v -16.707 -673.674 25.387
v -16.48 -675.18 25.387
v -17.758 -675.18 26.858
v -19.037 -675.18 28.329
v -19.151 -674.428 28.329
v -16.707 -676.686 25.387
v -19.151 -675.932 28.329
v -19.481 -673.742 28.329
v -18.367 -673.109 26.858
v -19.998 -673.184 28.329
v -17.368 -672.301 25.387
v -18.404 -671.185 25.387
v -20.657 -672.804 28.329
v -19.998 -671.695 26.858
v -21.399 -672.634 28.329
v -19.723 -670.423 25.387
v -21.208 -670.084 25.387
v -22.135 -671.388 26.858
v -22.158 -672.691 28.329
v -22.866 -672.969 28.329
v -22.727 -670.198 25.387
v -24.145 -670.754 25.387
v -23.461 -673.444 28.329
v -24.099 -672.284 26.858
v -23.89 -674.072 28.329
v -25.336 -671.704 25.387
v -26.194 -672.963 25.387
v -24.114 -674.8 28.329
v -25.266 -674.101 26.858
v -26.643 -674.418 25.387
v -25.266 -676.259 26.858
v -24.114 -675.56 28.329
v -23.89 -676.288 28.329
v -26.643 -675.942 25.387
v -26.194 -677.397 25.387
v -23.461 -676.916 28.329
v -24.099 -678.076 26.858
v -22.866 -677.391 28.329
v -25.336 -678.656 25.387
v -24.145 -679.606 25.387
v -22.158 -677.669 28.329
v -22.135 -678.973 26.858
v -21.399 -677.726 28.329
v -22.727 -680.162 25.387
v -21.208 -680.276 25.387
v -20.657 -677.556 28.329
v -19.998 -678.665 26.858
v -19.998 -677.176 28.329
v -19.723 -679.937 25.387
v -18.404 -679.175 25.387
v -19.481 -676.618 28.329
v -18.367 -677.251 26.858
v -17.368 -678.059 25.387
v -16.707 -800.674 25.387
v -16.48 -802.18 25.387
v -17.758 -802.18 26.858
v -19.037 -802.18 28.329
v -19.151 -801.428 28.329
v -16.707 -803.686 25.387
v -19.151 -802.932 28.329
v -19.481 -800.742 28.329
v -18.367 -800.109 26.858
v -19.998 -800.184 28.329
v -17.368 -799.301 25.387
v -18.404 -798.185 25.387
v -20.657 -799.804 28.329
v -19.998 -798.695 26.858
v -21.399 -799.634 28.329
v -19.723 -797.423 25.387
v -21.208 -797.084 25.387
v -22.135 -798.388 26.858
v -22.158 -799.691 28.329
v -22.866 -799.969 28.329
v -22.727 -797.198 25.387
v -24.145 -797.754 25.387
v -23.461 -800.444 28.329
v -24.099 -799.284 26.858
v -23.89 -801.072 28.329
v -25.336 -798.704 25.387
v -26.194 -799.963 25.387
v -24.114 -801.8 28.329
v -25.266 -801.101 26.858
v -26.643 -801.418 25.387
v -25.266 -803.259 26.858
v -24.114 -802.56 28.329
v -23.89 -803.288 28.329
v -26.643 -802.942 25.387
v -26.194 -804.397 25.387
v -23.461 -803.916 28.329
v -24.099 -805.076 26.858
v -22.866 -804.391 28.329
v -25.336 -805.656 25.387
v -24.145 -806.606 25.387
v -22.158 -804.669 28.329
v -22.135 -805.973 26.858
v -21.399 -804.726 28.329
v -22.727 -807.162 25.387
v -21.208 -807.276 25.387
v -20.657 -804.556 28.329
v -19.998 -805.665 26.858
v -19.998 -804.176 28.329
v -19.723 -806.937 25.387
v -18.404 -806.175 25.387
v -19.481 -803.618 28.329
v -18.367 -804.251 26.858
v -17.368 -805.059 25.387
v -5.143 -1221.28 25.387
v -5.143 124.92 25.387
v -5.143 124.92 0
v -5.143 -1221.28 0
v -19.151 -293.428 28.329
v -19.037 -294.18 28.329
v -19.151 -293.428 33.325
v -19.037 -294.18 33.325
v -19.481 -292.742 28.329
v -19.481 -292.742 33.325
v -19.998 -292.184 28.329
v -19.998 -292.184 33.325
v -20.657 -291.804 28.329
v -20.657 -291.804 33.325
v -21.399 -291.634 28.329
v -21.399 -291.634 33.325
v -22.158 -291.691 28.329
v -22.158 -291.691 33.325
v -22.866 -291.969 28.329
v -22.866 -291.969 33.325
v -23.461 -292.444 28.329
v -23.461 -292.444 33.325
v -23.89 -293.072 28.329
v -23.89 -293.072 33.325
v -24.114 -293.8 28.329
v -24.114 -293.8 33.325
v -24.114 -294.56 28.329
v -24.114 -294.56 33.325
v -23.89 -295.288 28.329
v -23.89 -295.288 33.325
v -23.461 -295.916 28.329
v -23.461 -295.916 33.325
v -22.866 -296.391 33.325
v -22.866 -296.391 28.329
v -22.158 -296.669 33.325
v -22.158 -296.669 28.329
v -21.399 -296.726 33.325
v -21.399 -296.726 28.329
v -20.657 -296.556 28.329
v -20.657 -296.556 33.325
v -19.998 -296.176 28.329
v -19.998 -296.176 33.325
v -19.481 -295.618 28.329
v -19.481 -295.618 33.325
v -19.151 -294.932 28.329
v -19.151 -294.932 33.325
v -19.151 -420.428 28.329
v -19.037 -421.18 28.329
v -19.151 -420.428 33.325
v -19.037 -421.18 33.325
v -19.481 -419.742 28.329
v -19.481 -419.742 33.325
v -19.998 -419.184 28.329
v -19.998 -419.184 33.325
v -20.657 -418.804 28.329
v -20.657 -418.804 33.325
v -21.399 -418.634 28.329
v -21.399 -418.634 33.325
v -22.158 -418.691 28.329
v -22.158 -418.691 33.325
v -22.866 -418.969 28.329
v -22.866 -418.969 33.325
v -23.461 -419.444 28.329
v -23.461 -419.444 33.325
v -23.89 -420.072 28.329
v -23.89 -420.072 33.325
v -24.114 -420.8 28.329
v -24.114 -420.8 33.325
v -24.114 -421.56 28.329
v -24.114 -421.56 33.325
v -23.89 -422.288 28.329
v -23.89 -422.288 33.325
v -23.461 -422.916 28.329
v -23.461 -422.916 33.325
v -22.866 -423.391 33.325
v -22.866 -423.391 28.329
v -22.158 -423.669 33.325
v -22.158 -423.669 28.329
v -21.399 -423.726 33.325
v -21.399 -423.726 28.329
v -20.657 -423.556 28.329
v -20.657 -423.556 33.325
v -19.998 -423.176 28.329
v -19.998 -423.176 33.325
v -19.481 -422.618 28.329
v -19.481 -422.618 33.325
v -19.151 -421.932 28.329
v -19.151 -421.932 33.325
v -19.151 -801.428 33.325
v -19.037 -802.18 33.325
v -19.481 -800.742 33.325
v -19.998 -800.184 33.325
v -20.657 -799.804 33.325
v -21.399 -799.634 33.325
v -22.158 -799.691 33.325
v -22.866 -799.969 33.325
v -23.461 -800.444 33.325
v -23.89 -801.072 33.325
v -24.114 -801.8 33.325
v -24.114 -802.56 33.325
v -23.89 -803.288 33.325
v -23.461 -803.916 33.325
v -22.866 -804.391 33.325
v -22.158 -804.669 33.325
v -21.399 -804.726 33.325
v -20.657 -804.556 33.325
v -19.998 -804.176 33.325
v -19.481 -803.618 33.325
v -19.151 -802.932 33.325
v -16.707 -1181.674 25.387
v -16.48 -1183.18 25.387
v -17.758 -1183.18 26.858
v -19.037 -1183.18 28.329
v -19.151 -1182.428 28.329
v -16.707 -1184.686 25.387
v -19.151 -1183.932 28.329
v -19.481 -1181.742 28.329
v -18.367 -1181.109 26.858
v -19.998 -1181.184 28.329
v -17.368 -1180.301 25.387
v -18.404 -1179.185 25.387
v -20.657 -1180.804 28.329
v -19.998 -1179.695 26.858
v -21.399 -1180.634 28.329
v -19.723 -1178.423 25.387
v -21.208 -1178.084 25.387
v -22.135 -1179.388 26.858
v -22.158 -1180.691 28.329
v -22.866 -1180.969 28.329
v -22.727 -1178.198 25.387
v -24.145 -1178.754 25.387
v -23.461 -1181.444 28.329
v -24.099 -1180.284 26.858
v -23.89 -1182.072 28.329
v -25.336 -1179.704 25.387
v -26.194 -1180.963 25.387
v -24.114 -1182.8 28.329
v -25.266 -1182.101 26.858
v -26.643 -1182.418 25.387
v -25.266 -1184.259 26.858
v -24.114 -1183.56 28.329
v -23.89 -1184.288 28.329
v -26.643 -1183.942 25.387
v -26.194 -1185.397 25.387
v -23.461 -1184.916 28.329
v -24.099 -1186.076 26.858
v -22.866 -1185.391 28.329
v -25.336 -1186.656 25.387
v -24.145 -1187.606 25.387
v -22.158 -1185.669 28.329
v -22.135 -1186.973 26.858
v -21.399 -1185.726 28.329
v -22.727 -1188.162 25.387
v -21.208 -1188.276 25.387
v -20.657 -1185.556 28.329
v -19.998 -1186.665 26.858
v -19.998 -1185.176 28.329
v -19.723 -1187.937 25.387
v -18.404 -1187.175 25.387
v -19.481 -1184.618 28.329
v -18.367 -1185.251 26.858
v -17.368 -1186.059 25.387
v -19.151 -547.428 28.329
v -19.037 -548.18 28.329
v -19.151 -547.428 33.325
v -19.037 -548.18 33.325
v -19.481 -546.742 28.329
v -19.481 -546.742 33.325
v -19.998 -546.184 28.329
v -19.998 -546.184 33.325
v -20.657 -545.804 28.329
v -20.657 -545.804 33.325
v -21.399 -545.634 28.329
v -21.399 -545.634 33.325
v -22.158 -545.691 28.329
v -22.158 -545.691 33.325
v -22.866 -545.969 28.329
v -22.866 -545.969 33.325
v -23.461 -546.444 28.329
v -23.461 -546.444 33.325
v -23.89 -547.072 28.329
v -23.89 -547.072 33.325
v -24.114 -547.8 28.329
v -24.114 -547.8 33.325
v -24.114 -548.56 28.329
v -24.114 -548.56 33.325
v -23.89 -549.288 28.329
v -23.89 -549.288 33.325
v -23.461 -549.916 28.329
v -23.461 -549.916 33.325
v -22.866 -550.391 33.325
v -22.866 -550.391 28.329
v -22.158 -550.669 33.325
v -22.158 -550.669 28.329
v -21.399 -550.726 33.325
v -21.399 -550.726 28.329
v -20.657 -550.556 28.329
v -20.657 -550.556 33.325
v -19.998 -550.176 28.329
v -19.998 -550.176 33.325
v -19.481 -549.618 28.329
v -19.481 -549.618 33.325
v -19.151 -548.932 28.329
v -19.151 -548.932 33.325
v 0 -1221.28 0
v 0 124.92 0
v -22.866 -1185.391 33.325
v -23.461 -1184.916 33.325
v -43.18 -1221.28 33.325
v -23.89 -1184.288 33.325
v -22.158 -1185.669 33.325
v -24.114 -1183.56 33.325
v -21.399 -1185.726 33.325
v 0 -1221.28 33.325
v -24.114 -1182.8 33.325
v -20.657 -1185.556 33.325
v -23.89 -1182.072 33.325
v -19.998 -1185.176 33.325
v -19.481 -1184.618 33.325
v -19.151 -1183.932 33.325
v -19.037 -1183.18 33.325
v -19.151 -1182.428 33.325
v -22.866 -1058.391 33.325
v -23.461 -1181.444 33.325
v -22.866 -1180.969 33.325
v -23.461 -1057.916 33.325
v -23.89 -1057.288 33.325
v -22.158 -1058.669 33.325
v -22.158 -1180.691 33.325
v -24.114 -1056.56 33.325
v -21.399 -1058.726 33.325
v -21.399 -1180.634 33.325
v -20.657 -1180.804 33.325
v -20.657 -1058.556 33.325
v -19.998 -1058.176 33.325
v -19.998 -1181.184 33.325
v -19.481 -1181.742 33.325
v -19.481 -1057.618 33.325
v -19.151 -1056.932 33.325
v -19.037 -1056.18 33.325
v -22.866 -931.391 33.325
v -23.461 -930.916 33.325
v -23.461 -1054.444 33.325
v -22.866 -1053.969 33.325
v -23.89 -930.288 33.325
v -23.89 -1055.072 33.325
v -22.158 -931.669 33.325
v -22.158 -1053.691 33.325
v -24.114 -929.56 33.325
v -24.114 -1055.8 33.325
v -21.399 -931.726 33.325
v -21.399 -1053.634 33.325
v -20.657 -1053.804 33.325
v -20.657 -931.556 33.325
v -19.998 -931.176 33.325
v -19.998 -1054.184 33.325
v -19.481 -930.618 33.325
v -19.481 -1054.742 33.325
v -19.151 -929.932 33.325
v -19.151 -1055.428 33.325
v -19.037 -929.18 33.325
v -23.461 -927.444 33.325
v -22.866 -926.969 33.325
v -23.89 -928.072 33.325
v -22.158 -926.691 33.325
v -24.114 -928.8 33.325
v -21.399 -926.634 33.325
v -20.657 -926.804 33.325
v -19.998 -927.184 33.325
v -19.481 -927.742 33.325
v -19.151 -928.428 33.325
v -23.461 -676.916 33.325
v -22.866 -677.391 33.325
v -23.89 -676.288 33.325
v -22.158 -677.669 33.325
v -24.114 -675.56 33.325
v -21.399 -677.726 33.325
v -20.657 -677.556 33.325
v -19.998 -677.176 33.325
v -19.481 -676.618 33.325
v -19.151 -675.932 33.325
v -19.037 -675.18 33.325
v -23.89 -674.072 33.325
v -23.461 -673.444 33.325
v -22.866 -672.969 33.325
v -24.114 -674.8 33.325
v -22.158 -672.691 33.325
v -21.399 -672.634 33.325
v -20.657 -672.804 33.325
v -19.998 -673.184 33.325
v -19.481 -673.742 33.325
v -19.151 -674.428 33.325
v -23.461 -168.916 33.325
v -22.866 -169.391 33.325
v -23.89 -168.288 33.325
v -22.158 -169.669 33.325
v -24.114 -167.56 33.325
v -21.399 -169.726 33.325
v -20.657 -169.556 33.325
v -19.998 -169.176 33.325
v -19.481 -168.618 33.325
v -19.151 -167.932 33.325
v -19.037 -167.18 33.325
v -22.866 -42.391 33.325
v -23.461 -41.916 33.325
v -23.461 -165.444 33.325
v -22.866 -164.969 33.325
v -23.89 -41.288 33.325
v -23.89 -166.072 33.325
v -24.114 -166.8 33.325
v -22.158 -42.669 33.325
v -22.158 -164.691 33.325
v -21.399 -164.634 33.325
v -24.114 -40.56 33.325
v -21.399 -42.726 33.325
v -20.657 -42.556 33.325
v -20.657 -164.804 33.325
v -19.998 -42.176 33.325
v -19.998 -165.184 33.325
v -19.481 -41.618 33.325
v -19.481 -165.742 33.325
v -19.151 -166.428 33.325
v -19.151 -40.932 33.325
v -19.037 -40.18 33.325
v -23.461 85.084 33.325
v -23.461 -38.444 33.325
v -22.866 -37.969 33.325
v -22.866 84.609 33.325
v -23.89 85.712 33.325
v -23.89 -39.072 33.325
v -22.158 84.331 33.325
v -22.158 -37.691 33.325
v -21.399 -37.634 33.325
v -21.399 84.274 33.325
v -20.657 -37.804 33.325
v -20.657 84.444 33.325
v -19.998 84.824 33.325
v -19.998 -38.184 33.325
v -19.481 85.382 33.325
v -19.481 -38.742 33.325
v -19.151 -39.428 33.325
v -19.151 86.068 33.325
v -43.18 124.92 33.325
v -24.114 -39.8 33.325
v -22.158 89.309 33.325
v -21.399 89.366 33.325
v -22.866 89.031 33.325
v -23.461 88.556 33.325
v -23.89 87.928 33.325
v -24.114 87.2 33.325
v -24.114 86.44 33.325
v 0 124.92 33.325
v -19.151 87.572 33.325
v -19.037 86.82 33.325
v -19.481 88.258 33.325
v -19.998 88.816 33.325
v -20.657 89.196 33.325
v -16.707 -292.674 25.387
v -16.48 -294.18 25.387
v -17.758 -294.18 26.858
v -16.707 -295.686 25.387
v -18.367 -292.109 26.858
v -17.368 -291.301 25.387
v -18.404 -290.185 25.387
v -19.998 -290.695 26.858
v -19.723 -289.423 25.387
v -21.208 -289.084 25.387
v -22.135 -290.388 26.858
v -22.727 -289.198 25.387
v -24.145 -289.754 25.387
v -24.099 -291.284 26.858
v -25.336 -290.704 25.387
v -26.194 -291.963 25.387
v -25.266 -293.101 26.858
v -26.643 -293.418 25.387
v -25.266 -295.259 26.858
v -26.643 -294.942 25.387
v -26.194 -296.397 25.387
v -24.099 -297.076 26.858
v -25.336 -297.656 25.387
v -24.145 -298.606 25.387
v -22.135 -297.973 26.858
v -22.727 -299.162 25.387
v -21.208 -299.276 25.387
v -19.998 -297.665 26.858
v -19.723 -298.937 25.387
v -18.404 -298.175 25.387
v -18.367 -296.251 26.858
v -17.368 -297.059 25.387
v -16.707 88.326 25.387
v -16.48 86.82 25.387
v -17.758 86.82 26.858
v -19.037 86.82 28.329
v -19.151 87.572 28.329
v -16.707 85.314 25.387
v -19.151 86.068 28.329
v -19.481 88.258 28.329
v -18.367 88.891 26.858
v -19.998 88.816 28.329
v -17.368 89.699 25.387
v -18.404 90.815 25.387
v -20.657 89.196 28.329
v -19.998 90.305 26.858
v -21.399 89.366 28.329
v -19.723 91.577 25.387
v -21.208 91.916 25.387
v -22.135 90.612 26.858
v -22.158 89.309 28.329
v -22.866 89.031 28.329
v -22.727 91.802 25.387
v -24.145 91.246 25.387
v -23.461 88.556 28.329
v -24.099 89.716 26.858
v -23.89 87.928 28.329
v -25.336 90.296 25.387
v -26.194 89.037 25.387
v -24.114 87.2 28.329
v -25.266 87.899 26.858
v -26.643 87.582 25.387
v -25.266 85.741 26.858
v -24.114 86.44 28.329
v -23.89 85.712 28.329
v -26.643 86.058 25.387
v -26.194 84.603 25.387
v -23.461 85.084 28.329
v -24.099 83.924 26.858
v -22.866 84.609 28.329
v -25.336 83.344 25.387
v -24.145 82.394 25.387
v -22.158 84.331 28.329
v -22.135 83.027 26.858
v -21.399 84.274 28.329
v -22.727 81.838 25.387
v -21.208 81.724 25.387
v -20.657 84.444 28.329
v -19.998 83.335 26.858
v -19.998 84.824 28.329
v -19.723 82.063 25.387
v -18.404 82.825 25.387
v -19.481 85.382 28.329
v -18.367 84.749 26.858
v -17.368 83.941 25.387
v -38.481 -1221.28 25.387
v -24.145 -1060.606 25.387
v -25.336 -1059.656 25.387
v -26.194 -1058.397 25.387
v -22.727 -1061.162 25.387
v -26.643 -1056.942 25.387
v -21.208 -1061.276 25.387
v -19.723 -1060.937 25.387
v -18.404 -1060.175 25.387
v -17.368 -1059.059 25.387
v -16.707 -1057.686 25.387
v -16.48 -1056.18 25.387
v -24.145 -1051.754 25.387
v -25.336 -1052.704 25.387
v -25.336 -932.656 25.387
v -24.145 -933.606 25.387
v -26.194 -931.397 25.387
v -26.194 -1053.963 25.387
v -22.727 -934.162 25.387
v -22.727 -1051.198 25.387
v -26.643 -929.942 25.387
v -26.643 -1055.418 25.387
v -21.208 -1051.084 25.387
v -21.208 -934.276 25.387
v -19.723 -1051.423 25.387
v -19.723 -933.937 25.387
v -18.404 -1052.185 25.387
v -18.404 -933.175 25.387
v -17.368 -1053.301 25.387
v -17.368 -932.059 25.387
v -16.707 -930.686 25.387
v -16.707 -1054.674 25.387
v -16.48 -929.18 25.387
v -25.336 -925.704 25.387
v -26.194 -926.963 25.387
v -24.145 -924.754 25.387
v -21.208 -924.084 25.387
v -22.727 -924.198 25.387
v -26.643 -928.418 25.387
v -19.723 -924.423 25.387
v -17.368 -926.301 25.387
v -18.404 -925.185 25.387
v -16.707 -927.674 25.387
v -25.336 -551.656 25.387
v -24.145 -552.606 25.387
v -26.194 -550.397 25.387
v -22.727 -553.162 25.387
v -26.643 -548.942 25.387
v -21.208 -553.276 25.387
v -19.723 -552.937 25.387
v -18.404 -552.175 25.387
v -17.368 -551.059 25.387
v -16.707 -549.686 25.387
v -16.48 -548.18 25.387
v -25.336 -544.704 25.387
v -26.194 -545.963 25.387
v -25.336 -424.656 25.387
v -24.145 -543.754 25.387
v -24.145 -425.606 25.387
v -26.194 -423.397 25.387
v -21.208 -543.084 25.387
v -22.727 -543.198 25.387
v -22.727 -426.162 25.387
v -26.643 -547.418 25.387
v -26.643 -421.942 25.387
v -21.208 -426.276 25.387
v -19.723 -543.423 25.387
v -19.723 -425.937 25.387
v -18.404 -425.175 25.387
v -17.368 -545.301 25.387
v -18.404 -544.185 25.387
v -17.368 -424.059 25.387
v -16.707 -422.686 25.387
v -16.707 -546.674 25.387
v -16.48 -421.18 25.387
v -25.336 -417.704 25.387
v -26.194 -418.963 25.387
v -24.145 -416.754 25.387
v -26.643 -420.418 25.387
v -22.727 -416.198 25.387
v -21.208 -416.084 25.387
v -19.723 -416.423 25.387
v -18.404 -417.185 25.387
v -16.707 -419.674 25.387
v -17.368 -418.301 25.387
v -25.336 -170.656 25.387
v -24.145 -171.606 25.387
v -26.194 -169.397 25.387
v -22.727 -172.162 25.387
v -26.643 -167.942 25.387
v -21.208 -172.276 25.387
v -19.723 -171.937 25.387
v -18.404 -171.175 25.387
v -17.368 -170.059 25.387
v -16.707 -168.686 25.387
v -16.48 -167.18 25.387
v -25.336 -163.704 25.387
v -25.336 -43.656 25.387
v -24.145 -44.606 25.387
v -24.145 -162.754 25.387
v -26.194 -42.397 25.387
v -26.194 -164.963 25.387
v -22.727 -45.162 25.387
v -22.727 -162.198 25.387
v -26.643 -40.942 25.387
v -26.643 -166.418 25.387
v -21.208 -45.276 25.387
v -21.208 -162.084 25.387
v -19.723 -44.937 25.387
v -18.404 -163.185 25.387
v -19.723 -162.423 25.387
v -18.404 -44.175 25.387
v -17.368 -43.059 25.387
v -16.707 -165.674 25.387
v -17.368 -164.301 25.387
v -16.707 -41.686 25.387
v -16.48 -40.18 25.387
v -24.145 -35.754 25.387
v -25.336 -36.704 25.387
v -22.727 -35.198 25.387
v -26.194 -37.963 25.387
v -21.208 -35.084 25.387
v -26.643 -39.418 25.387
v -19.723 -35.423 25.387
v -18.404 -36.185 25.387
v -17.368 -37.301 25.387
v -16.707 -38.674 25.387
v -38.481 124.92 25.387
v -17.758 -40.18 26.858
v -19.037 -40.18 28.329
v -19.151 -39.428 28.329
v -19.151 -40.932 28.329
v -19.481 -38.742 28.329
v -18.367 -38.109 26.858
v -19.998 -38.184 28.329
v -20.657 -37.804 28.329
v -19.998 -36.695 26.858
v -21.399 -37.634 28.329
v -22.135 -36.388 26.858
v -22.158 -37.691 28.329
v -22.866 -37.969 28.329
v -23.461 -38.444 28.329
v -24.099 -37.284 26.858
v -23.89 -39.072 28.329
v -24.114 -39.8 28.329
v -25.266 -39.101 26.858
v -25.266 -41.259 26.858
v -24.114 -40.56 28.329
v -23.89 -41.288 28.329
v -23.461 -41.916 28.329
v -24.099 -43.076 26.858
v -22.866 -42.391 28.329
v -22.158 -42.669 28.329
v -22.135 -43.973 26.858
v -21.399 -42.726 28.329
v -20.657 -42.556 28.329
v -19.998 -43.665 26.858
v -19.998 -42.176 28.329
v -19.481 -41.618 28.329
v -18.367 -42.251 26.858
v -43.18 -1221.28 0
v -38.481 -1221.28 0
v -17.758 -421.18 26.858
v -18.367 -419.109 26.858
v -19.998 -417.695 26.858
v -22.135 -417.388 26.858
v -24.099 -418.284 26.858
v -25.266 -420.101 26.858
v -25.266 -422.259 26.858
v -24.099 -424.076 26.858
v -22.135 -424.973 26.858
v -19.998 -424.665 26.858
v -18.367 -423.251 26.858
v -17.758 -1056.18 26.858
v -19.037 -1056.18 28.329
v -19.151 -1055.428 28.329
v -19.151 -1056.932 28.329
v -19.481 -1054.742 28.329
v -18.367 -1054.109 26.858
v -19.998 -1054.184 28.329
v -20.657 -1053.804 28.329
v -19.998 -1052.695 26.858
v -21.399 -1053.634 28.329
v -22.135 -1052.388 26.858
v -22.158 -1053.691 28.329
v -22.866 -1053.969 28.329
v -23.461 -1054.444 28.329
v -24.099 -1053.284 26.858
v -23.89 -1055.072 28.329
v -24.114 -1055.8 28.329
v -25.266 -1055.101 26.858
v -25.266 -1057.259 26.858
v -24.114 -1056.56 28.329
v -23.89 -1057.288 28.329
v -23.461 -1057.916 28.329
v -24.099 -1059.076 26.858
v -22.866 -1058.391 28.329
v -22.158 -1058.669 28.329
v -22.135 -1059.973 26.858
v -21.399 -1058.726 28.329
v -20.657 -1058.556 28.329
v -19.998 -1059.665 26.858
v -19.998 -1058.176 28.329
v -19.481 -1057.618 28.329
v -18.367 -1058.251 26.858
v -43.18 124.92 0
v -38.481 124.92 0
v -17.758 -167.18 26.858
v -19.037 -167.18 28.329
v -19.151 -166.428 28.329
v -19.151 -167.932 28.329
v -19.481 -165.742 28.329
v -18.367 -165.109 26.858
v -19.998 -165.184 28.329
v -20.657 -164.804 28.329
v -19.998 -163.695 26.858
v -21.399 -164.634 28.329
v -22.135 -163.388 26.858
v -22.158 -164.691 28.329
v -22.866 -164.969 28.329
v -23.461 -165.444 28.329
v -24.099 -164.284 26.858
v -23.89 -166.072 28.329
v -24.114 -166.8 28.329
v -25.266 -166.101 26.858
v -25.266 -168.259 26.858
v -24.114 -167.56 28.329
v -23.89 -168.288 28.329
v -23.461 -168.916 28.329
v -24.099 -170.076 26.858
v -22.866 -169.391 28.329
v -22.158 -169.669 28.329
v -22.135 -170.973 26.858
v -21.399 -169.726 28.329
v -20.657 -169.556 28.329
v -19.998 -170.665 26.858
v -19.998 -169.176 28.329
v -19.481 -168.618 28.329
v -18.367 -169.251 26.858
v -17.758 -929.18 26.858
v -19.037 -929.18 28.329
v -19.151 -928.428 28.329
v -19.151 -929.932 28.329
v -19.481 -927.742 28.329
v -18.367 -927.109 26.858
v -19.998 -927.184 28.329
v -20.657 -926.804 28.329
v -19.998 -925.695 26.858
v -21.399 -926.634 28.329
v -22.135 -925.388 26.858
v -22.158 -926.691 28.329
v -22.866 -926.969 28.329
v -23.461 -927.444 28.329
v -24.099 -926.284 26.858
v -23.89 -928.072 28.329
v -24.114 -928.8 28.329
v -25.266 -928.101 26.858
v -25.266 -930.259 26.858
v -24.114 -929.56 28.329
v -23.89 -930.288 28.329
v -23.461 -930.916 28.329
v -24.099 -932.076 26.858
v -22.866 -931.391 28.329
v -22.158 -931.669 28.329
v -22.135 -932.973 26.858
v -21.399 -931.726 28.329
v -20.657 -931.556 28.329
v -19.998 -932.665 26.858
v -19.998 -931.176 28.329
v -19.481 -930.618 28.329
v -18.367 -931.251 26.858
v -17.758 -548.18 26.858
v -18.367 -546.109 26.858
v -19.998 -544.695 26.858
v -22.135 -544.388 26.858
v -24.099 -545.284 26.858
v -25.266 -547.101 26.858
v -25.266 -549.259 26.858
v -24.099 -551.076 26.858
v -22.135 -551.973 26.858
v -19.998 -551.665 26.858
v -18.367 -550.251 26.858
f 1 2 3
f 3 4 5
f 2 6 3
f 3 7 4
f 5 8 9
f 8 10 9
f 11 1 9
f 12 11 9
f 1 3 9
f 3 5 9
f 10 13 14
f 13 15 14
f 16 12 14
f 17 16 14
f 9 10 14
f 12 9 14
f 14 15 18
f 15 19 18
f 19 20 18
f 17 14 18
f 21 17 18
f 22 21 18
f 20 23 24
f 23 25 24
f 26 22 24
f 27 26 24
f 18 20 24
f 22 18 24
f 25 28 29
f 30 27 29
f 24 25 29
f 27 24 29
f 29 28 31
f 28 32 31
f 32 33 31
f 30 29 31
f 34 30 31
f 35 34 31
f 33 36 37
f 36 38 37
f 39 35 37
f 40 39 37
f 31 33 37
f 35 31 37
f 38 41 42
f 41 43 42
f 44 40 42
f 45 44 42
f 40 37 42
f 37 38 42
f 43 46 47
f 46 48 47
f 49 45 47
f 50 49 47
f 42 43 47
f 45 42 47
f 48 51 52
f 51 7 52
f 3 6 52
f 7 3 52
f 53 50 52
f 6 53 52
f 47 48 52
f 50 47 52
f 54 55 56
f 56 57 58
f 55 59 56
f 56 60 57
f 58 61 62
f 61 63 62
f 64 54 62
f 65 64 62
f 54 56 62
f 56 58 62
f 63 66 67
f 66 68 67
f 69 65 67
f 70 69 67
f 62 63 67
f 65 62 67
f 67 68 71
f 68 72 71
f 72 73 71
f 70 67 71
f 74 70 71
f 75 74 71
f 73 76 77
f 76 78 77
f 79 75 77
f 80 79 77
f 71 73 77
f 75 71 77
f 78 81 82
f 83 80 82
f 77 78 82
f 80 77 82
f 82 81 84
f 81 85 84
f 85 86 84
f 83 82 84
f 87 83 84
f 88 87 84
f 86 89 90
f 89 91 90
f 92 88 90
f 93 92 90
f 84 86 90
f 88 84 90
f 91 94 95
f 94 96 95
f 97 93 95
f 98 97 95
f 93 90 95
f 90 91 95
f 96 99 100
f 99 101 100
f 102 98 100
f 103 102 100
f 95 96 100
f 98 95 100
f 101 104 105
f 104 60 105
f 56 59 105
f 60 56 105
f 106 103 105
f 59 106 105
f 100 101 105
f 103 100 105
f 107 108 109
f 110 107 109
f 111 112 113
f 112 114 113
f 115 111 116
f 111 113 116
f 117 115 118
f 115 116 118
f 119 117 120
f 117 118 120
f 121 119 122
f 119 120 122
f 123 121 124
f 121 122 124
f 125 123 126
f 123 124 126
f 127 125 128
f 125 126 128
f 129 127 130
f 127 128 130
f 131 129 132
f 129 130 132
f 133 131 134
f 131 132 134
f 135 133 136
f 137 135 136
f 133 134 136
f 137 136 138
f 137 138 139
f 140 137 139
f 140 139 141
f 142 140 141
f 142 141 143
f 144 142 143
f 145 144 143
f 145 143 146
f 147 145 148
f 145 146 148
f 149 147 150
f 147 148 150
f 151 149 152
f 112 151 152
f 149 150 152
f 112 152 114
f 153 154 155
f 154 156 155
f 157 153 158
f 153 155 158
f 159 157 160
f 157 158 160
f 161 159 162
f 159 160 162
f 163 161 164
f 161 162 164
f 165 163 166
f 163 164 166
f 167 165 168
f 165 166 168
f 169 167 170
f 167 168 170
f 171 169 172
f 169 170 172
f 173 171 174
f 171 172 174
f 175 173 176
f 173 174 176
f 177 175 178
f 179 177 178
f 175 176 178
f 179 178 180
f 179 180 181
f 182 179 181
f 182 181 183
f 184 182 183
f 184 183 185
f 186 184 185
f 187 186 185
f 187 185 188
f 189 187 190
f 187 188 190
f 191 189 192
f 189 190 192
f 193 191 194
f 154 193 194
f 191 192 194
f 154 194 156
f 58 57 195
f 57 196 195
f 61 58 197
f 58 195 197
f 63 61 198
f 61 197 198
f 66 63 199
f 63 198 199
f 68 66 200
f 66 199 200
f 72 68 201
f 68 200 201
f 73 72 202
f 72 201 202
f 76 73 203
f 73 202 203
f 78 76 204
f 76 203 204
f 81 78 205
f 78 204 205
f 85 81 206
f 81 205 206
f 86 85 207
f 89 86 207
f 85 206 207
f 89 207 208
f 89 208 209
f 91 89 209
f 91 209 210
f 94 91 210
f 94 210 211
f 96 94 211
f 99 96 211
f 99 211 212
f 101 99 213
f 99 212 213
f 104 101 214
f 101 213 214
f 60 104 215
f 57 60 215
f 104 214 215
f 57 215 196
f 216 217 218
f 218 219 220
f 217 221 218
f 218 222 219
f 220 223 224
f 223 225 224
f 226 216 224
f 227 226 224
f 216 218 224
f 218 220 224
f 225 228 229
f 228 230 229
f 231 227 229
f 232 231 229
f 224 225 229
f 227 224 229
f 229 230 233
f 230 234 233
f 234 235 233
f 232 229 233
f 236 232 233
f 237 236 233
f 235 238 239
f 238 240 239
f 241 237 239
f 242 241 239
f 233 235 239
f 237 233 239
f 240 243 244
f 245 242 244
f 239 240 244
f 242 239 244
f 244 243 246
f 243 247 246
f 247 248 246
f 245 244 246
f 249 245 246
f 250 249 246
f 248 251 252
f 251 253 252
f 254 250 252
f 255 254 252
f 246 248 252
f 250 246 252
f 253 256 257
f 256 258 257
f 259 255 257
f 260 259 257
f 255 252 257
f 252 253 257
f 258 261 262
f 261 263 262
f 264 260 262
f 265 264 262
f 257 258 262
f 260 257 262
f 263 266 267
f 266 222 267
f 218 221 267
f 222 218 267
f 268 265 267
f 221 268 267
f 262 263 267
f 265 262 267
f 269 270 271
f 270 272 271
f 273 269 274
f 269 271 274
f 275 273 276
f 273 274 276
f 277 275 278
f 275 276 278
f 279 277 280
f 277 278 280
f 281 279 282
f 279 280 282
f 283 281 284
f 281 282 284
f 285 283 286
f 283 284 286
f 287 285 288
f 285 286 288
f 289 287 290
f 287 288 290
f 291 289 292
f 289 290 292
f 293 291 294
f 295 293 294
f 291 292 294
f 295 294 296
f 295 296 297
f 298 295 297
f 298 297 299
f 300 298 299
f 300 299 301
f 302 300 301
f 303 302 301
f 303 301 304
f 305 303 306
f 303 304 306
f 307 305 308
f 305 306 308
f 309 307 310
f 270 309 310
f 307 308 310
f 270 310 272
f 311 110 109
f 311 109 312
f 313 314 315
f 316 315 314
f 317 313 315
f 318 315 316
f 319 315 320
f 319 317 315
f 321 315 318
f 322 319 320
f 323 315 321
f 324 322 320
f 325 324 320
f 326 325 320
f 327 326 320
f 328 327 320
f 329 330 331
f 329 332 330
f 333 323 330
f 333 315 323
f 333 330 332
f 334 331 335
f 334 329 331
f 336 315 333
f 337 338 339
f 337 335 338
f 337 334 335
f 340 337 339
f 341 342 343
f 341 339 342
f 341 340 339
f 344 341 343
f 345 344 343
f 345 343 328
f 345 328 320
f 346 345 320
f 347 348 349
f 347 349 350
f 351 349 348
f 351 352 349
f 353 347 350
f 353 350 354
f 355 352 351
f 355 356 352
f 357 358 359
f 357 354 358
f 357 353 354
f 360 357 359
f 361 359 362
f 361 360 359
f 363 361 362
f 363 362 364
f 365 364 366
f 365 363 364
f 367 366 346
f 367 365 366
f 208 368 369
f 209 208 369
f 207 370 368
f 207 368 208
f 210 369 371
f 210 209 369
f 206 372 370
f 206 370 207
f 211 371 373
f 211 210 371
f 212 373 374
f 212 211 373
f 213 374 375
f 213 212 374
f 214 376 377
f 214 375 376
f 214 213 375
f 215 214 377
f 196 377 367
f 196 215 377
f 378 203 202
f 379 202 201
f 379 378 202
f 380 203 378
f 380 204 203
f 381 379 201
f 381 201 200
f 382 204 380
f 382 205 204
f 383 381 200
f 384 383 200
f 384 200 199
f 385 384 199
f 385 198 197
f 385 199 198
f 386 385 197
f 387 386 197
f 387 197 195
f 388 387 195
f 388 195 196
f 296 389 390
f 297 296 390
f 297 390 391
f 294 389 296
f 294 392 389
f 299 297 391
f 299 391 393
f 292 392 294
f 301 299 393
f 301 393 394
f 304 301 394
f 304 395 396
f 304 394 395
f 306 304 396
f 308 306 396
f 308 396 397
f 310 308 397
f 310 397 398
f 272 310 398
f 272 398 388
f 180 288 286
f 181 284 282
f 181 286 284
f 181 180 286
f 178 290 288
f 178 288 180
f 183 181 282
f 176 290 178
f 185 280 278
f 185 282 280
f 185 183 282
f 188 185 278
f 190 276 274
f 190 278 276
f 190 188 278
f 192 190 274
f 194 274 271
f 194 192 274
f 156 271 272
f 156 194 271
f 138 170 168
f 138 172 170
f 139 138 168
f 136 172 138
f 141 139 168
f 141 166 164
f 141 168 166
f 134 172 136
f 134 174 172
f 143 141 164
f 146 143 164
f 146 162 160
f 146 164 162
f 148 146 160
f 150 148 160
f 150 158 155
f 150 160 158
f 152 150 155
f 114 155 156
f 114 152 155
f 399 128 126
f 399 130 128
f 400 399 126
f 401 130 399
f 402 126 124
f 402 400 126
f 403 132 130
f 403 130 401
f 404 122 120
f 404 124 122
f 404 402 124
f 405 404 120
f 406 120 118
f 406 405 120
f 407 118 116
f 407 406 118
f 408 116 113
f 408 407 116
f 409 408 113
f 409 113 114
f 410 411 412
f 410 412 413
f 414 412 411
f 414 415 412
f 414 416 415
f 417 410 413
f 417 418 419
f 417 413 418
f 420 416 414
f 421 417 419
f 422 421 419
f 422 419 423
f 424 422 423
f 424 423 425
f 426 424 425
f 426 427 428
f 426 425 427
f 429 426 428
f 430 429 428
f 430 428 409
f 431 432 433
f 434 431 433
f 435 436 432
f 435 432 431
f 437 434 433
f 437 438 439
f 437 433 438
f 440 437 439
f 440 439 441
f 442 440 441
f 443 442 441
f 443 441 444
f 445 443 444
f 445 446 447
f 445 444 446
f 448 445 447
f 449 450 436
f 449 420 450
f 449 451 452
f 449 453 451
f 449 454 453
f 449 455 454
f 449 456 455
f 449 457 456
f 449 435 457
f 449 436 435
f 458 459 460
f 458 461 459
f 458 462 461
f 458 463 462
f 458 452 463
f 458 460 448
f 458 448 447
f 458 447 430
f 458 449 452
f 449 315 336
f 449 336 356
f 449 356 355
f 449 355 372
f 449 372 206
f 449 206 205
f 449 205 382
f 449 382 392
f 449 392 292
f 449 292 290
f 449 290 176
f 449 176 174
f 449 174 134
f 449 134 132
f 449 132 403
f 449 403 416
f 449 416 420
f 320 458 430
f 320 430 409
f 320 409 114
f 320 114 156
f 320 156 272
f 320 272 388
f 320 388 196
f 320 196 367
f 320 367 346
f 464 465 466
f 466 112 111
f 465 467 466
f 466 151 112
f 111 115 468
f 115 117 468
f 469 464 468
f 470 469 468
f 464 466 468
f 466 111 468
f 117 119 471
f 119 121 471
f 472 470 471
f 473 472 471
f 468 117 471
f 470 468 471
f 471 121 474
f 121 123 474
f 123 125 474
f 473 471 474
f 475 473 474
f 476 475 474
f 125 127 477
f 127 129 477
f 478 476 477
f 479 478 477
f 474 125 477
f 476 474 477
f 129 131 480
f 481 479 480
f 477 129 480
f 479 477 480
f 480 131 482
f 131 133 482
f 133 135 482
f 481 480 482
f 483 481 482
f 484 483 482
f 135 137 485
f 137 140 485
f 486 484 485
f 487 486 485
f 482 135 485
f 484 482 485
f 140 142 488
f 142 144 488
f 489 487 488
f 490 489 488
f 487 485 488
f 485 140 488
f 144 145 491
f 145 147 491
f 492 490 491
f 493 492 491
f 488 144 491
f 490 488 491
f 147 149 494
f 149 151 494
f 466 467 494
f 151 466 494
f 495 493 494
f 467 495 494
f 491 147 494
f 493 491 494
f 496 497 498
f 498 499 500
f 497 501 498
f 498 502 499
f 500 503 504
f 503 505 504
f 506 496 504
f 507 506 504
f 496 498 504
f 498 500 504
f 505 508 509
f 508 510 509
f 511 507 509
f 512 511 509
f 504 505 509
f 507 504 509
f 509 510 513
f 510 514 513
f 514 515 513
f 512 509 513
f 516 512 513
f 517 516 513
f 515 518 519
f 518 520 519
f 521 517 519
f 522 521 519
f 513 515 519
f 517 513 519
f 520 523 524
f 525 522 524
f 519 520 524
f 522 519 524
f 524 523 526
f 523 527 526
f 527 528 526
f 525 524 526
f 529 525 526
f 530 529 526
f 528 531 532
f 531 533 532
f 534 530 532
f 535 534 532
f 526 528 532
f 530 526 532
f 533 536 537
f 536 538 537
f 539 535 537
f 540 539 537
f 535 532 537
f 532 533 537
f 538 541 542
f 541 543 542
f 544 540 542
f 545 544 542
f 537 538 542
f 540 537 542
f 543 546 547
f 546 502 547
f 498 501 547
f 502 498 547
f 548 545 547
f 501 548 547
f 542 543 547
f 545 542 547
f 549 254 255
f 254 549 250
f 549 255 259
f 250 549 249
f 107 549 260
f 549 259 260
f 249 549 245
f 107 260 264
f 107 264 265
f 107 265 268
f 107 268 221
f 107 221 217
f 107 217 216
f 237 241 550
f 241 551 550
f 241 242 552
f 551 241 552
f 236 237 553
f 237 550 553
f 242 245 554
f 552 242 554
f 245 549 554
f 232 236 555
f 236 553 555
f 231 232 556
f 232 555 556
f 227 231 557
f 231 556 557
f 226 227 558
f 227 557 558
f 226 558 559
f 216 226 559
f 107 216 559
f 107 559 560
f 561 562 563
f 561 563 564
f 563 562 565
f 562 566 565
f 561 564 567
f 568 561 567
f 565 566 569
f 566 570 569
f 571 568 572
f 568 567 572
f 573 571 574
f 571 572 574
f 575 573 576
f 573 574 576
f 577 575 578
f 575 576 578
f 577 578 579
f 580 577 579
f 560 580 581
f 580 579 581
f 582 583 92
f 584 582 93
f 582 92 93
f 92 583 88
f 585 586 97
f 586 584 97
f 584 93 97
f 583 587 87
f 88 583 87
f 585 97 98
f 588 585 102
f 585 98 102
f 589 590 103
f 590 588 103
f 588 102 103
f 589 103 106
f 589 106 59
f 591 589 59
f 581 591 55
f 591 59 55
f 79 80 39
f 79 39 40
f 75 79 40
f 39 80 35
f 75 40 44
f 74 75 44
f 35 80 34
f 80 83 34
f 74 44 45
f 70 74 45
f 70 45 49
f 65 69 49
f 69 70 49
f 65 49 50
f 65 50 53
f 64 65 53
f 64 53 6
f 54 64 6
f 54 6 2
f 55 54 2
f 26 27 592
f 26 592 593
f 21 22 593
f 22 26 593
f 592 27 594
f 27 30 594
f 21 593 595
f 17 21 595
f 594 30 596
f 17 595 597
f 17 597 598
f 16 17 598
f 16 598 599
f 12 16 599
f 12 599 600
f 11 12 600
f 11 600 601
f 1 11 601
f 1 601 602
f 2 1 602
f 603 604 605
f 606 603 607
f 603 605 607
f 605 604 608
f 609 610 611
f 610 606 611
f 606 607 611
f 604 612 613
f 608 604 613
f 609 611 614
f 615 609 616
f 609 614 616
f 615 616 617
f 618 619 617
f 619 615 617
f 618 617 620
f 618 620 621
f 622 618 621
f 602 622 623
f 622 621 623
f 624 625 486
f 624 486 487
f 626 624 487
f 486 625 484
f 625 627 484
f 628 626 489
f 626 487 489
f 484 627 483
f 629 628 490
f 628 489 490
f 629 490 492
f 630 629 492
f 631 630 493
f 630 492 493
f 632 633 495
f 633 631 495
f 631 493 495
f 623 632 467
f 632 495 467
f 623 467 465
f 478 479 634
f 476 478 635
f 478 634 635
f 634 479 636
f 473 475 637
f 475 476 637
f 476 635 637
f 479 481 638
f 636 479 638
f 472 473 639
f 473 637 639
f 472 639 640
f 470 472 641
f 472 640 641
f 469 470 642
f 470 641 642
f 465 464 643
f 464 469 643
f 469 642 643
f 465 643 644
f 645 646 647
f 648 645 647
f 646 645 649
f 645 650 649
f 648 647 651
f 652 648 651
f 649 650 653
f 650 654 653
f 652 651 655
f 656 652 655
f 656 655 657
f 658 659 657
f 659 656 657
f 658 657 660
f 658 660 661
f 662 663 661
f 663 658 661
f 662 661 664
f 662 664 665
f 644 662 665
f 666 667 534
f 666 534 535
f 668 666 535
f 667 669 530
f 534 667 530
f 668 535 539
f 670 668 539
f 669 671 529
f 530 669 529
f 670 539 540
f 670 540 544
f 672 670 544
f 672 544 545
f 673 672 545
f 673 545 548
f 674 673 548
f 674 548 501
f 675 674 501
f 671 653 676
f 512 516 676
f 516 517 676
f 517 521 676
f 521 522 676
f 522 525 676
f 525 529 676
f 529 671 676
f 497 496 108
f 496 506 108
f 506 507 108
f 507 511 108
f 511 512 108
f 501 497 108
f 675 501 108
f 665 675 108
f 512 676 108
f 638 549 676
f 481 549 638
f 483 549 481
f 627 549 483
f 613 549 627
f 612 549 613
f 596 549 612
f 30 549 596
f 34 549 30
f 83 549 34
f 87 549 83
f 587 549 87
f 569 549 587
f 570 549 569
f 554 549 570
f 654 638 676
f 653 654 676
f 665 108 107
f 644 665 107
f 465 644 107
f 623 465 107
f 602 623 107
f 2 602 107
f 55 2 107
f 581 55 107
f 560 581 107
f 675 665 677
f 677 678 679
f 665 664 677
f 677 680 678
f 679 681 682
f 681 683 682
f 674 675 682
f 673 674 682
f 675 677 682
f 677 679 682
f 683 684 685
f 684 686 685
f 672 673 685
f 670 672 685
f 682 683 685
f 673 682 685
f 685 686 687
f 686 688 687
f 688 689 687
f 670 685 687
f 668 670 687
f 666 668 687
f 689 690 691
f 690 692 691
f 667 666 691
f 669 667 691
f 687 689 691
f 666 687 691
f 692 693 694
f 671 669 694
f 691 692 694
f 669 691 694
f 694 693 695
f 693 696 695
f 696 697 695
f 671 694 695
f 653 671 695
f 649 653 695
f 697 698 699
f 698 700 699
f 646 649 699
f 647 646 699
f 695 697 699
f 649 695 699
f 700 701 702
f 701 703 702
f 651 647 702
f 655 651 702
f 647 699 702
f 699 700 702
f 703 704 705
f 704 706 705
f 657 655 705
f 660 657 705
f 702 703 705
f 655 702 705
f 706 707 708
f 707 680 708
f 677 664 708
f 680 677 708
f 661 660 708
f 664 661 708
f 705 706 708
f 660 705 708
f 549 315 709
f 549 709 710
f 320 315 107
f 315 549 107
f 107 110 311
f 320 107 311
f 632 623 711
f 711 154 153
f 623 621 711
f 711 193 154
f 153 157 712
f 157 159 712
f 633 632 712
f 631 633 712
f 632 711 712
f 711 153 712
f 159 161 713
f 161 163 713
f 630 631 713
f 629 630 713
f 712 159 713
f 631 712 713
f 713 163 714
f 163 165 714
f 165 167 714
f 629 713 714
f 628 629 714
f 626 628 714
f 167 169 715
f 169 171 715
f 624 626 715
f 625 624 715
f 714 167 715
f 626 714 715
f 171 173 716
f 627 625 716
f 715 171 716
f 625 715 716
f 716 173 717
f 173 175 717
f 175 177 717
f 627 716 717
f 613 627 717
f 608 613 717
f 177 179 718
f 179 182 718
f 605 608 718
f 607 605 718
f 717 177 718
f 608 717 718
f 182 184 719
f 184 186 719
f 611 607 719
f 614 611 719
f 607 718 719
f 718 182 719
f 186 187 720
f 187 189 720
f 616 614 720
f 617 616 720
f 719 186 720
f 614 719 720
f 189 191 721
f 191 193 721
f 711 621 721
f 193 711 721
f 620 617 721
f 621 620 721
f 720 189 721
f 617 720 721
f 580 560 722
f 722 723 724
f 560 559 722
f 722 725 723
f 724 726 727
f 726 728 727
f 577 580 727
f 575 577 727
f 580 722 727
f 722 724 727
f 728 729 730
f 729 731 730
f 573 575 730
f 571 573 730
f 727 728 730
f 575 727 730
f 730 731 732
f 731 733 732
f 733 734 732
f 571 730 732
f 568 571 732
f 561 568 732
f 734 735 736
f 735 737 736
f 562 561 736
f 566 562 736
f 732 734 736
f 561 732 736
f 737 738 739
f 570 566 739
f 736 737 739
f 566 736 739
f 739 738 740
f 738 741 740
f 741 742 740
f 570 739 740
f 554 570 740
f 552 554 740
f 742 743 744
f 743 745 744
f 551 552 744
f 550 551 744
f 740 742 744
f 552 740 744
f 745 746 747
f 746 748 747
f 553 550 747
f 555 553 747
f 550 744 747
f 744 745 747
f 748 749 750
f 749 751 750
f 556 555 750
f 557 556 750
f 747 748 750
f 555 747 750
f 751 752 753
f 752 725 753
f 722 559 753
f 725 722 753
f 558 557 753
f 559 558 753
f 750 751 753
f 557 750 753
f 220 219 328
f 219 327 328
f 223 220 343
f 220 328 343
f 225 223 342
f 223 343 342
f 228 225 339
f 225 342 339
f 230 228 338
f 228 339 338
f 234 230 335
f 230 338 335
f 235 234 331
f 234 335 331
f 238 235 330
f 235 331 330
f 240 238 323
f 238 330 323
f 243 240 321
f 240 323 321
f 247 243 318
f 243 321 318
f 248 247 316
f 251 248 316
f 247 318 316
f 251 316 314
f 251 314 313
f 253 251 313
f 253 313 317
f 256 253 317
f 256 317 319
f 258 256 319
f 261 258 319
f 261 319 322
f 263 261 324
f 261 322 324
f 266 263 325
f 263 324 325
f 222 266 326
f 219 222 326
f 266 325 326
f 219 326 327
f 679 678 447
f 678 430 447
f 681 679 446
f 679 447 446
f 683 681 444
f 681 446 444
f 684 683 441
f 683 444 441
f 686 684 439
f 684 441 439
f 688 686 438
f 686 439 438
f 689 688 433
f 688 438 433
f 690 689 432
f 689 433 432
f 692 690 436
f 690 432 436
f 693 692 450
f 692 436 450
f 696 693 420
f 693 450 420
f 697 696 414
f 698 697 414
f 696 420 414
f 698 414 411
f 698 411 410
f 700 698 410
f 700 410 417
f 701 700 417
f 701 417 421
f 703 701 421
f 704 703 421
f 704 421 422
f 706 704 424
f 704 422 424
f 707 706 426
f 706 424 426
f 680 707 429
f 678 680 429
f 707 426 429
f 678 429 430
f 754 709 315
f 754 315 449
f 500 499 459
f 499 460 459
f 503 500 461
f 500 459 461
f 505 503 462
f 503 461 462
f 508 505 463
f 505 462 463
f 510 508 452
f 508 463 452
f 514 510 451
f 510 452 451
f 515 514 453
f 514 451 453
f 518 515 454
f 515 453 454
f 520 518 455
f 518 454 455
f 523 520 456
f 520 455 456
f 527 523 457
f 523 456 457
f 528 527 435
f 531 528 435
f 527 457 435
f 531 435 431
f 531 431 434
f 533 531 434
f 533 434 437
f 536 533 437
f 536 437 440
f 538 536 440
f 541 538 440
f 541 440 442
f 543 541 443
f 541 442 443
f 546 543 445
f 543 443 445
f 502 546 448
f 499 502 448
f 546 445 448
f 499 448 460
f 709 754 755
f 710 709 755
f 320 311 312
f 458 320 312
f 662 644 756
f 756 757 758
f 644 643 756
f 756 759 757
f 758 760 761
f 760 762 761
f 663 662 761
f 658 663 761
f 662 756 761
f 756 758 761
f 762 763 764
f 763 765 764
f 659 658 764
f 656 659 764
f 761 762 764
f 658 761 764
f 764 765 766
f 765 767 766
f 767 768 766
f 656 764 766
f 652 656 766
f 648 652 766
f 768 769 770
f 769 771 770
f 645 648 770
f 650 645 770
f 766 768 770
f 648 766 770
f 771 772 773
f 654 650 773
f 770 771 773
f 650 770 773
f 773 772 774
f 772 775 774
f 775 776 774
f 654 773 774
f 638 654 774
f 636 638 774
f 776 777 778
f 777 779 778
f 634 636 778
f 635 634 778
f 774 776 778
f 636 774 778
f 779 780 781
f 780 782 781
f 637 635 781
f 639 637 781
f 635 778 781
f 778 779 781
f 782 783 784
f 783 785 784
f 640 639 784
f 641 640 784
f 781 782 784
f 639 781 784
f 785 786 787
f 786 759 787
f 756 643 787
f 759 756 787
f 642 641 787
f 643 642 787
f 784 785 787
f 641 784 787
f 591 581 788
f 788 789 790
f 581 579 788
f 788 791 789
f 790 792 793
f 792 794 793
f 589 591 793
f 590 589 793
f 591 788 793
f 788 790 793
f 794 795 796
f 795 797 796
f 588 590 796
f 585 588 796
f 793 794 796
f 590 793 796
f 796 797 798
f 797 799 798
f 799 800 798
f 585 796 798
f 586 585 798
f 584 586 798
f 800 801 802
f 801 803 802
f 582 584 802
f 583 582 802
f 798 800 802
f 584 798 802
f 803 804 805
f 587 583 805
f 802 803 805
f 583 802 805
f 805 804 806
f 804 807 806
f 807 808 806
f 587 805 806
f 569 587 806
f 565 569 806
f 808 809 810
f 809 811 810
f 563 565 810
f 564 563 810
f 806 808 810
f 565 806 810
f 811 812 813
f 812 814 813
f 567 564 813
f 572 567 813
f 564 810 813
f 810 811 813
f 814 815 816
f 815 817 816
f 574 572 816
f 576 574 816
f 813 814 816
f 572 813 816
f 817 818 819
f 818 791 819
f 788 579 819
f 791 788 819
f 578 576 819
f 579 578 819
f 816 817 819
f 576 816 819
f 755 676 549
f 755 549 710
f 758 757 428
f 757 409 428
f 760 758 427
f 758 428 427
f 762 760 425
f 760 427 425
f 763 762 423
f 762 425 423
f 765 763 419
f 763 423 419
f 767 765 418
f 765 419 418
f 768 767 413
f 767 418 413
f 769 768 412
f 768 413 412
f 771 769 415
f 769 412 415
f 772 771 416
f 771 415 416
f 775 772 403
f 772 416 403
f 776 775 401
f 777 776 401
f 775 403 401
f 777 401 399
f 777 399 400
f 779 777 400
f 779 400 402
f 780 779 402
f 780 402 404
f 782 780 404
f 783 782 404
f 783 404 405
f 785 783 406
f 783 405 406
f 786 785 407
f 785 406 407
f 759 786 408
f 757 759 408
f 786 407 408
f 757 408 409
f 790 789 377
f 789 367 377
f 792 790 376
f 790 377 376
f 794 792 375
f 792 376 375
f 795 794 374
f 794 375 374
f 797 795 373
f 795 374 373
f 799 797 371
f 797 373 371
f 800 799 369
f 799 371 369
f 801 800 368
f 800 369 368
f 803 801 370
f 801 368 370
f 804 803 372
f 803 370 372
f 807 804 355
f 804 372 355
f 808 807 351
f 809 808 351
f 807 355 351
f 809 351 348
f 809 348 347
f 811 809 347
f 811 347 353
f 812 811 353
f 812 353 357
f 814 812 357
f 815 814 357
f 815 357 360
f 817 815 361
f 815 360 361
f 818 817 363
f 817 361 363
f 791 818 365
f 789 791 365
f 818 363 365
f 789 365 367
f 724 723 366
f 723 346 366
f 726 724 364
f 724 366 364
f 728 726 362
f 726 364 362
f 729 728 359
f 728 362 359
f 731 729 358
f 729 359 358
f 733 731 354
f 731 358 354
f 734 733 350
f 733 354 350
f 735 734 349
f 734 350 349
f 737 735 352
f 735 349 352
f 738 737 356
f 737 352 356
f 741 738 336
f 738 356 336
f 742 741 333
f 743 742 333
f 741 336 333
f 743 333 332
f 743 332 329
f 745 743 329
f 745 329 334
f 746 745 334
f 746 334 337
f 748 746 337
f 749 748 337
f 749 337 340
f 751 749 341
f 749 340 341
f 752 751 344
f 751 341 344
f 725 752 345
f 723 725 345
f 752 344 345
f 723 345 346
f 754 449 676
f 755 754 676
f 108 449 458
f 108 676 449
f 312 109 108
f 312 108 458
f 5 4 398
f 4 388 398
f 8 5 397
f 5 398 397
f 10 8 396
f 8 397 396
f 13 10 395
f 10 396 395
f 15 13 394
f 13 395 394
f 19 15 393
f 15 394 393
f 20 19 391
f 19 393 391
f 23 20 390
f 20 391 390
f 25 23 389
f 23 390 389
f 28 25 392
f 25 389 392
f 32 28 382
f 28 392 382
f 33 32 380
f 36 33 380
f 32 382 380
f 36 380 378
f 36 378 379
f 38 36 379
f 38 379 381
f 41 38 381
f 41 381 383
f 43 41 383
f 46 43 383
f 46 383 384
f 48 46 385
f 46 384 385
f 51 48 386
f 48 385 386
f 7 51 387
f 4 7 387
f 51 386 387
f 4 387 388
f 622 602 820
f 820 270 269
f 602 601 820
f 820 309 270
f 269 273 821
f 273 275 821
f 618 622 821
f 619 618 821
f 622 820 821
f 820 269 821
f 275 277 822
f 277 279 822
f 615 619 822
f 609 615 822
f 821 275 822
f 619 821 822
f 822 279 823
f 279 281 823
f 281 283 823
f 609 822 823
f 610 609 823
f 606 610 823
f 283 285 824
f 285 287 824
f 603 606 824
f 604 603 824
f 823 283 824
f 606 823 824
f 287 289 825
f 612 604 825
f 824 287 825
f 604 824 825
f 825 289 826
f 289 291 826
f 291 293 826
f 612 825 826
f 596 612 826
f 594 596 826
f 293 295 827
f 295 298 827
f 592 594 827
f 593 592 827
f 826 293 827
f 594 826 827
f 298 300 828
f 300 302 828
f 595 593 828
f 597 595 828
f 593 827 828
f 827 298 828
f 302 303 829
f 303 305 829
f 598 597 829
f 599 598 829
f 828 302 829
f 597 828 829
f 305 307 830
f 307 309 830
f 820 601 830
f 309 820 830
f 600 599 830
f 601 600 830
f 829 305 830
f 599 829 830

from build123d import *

# Parameters (mm, degrees)
SKETCH1_W                                       = 43.18
SKETCH1_H                                       = 1346.2
BOSS_EXTRUDE1_DEPTH                             = 33.3248
SKETCH9_W                                       = 33.3375
SKETCH9_H                                       = 33.121582444
CUT_EXTRUDE1_DEPTH                              = 1348.304529308
CSK_FOR_10_FLAT_HEAD_MACHINE_SCREW3_D           = 5.1054
CSK_FOR_10_FLAT_HEAD_MACHINE_SCREW3_DEPTH       = 76.2
CSK_FOR_10_FLAT_HEAD_MACHINE_SCREW3_CSINK_D     = 10.2206044
CSK_FOR_10_FLAT_HEAD_MACHINE_SCREW3_CSINK_ANGLE = 82
CSK_FOR_10_FLAT_HEAD_MACHINE_SCREW3_TIP         = 1.533816902


with BuildPart() as part:
    # Sketch1 → Boss-Extrude1 (new body)
    with BuildSketch(Plane.XY):
        with Locations((-21.59, -548.180033686)):
            Rectangle(SKETCH1_W, SKETCH1_H)
    extrude(amount=BOSS_EXTRUDE1_DEPTH)

    # Sketch9 → Cut-Extrude1 (cut, through all)
    with BuildSketch(Plane(origin=(0, 124.919966314, 0), x_dir=(1, 0, 0), z_dir=(0, 1, 0))):
        with Locations((-21.81225, -8.826508778)):
            Rectangle(SKETCH9_W, SKETCH9_H)
    extrude(amount=-CUT_EXTRUDE1_DEPTH, mode=Mode.SUBTRACT)

    # CSK for #10 Flat Head Machine Screw3
    with Locations(Plane(origin=(0, 0, 25.3873), x_dir=(-1, 0, 0), z_dir=(0, 0, -1))):
        with Locations((21.59, -1183.180033686), (21.59, -1056.180033686), (21.59, -929.180033686), (21.59, -802.180033686), (21.59, -675.180033686), (21.59, -548.180033686), (21.59, -421.180033686), (21.59, -294.180033686), (21.59, -167.180033686), (21.59, -40.180033686), (21.59, 86.819966314)):
            CounterSinkHole(CSK_FOR_10_FLAT_HEAD_MACHINE_SCREW3_D / 2, CSK_FOR_10_FLAT_HEAD_MACHINE_SCREW3_CSINK_D / 2, depth=CSK_FOR_10_FLAT_HEAD_MACHINE_SCREW3_DEPTH, counter_sink_angle=CSK_FOR_10_FLAT_HEAD_MACHINE_SCREW3_CSINK_ANGLE)
            with Locations((0, 0, -(CSK_FOR_10_FLAT_HEAD_MACHINE_SCREW3_DEPTH + CSK_FOR_10_FLAT_HEAD_MACHINE_SCREW3_TIP / 2))):  # 118° drill point
                Cone(0, CSK_FOR_10_FLAT_HEAD_MACHINE_SCREW3_D / 2, CSK_FOR_10_FLAT_HEAD_MACHINE_SCREW3_TIP, mode=Mode.SUBTRACT)


solid = part.part
